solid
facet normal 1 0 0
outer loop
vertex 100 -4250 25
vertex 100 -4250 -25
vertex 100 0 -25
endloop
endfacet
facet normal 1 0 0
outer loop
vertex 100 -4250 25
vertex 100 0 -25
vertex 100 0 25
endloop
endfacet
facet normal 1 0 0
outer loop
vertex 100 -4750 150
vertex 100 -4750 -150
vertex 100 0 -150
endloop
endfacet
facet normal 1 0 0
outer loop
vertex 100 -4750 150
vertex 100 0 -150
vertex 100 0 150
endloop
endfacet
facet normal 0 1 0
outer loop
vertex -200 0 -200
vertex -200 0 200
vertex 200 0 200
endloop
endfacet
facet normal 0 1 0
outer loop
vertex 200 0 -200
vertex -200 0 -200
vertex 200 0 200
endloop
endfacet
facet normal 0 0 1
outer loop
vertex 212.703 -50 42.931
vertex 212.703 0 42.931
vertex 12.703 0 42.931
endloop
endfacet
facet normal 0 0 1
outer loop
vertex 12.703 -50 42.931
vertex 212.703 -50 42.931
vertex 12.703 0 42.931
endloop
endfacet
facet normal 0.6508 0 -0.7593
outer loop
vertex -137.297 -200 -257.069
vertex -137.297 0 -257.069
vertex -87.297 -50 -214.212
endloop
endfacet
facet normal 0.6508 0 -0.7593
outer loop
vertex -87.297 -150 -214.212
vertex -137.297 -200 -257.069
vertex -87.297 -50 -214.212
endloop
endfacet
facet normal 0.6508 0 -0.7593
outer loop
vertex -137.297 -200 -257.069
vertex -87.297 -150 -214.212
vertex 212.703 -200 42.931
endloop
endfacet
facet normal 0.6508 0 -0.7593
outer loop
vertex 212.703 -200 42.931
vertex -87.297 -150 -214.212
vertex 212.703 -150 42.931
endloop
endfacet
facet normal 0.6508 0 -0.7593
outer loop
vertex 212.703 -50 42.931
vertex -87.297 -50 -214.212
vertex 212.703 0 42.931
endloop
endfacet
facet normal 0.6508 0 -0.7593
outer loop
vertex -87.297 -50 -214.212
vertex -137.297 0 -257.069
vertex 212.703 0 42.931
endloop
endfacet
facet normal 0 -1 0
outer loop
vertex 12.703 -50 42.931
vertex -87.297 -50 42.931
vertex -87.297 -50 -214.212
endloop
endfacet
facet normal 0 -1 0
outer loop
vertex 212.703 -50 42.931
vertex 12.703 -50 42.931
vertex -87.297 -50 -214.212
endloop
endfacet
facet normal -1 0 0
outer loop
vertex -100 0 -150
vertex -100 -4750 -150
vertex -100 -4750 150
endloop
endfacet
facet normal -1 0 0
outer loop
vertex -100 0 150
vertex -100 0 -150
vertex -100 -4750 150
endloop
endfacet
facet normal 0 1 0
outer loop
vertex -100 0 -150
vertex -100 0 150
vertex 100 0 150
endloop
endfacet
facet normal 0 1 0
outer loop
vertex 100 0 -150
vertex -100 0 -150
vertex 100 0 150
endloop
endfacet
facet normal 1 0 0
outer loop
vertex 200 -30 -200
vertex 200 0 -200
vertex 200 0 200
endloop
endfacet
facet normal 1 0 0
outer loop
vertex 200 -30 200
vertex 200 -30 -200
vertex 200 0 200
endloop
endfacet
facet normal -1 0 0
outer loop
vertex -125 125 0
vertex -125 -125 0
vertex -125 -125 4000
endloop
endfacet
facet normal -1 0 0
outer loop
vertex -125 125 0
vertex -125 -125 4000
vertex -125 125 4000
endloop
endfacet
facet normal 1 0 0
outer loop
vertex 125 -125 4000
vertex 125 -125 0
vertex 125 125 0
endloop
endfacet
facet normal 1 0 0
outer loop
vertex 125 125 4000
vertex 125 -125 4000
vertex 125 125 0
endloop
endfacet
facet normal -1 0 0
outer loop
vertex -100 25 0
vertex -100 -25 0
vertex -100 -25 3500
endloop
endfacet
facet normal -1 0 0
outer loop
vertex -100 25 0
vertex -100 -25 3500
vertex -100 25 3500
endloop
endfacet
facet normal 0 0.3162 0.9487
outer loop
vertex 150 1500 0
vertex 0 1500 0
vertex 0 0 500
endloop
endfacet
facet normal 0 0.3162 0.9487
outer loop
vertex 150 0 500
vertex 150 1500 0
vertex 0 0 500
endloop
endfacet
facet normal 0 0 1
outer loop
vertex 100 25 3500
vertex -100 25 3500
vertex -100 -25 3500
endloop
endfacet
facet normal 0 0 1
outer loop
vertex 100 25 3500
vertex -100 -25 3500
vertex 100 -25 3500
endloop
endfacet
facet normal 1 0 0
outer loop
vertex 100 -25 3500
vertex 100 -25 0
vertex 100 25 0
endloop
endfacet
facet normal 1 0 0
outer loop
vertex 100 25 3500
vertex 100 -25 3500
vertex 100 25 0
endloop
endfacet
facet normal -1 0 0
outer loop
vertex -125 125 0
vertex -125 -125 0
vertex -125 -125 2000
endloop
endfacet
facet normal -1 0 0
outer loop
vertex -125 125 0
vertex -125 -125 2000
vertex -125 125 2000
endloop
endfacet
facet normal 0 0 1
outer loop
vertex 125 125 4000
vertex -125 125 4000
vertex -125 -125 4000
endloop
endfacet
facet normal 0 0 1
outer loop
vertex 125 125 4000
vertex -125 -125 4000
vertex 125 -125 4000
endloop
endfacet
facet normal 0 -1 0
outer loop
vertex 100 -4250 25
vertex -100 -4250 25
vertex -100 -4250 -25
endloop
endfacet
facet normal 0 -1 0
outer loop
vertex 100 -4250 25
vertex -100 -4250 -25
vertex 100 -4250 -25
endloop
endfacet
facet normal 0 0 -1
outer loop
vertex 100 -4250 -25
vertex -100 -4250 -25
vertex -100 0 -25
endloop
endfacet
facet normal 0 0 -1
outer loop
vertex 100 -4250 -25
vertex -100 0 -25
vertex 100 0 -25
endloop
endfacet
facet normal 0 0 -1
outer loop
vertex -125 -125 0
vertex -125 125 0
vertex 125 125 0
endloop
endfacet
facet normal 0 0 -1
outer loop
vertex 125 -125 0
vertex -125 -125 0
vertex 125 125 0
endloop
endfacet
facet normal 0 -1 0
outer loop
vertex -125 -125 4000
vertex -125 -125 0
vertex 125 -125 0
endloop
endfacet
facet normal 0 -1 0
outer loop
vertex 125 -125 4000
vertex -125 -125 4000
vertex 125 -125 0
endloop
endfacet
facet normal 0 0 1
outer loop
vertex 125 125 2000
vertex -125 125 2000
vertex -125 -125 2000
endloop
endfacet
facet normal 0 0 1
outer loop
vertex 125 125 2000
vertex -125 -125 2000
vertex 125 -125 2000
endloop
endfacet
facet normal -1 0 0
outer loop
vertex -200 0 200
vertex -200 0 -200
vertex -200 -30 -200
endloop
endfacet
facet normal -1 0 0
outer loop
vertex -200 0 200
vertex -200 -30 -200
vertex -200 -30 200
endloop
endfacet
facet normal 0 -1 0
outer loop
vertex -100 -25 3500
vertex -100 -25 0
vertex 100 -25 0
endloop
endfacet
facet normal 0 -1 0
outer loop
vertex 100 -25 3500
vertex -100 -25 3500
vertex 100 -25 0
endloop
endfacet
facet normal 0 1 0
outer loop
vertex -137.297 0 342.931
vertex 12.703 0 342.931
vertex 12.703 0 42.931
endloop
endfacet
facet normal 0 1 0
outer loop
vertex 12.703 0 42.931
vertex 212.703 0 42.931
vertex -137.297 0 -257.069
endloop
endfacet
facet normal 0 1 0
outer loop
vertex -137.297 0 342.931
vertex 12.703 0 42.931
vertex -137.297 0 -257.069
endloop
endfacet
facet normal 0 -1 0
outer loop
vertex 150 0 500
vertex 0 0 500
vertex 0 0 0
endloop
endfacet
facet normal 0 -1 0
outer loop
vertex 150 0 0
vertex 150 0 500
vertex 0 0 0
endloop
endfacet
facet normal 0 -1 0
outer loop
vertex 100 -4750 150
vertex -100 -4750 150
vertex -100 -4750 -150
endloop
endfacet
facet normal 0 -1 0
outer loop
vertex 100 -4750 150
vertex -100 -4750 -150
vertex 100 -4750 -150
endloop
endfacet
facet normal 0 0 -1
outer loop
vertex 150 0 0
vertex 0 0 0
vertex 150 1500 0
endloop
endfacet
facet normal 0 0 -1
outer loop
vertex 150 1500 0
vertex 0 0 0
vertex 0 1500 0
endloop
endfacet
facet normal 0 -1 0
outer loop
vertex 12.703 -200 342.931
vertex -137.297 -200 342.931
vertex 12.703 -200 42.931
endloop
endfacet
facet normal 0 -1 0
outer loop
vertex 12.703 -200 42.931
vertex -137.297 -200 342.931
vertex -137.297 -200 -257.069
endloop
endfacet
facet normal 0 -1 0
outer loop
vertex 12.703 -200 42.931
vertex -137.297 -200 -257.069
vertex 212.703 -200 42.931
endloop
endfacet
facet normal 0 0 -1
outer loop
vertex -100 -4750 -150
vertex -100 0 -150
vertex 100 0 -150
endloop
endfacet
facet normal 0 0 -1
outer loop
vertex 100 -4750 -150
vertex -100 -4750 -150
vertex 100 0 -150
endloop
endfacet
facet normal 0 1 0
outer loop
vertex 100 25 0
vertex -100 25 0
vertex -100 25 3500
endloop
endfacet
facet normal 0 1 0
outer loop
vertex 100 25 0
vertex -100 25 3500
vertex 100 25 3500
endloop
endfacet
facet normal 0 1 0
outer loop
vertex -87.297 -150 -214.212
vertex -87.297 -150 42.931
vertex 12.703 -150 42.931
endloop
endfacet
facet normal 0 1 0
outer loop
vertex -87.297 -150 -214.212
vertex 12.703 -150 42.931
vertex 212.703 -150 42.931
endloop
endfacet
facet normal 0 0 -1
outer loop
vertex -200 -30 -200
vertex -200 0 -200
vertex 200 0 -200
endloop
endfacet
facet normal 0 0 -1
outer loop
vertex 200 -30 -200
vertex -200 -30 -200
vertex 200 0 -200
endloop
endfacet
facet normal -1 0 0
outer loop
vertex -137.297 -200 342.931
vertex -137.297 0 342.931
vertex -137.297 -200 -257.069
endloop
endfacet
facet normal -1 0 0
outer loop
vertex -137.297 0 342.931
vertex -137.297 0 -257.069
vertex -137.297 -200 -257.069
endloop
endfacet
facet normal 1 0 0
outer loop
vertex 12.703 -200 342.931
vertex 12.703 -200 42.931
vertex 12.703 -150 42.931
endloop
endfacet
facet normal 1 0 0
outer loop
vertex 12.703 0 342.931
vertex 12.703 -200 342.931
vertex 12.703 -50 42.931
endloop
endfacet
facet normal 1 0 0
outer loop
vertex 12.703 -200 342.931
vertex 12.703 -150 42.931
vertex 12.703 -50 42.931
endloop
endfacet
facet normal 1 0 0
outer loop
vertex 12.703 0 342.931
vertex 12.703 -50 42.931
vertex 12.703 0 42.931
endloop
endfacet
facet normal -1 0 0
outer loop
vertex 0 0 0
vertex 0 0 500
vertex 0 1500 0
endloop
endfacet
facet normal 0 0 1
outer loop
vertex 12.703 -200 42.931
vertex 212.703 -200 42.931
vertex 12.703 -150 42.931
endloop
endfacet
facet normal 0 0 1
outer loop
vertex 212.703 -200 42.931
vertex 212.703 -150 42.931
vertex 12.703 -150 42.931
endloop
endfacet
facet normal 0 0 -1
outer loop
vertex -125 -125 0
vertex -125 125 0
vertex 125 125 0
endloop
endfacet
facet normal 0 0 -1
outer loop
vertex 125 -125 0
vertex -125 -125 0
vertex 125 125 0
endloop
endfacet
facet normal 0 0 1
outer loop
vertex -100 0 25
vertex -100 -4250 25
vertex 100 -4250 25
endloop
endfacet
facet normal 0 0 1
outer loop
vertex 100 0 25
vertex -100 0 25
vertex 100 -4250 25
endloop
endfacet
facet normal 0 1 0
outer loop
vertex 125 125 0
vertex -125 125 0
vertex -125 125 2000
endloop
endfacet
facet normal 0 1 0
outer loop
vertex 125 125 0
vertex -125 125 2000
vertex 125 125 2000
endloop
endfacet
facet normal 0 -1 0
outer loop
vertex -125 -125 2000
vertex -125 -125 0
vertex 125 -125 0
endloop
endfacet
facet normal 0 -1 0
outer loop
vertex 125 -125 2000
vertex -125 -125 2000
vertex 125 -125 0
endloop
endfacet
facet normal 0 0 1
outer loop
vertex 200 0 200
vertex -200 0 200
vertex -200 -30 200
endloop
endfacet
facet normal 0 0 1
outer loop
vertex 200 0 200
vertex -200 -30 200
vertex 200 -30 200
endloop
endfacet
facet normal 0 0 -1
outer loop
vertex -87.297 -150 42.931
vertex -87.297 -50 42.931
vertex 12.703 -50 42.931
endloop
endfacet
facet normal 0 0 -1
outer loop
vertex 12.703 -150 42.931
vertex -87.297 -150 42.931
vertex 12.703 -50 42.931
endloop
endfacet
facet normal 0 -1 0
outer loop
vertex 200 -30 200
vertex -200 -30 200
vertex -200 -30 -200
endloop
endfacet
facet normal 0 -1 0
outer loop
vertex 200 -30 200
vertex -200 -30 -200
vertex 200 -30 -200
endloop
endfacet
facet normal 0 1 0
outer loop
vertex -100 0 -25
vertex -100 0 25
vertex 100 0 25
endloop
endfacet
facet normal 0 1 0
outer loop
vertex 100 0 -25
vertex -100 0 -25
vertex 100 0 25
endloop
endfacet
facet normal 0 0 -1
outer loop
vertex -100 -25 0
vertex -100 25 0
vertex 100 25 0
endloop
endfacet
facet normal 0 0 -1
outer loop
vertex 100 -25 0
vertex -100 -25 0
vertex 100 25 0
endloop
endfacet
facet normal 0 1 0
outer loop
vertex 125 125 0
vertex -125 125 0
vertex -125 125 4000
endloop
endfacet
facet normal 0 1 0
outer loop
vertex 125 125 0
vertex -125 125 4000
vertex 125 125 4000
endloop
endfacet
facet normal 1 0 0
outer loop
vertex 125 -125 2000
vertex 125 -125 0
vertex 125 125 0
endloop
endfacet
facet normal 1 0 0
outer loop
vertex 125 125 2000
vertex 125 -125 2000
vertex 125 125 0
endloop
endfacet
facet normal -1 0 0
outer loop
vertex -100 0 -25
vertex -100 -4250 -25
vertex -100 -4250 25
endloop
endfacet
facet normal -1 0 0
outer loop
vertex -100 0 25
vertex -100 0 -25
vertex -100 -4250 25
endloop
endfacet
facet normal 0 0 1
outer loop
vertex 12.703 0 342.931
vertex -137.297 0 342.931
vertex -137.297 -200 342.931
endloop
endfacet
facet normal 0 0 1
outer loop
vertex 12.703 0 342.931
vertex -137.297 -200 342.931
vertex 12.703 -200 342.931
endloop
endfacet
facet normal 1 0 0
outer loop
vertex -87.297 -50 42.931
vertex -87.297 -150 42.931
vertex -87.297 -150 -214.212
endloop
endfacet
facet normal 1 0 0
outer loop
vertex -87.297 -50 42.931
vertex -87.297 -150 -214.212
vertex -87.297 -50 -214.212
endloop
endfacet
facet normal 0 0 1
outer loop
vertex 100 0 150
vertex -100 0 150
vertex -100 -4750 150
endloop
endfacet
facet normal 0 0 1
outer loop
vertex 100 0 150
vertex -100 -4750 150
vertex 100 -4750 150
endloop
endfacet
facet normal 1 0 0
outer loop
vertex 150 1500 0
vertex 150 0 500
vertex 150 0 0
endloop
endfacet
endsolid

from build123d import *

# Parameters (mm, degrees)
F0_W      = 250
F0_H      = 250
F1_DEPTH  = 4000
F2_W      = 200
F2_H      = 50
F3_DEPTH  = 3500
F4_W      = 200
F4_H      = 300
F5_DEPTH  = 4750
F7_DEPTH  = 200
F8_W      = 300
F8_H      = 100
F9_DEPTH  = 300.001
F10_W     = 200
F10_H     = 50
F11_DEPTH = 4250
F12_W     = 100
F12_H     = 100
F13_DEPTH = 300
F14_W     = 400
F14_H     = 400
F15_DEPTH = 30
F17_DEPTH = 150
F18_W     = 250
F18_H     = 250
F19_DEPTH = 2000


with BuildPart() as f1:
    # F0 (on Top) → F1 (new body)
    with BuildSketch(Plane.XY):
        Rectangle(F0_W, F0_H)
    extrude(amount=F1_DEPTH)


with BuildPart() as f3:
    # F2 (on Top) → F3 (new body)
    with BuildSketch(Plane.XY):
        Rectangle(F2_W, F2_H)
    extrude(amount=F3_DEPTH)


with BuildPart() as f5:
    # F4 (on Front) → F5 (new body)
    with BuildSketch(Plane.XZ):
        Rectangle(F4_W, F4_H)
    extrude(amount=F5_DEPTH)


with BuildPart() as f7:
    # F6 (on Front) → F7 (new body)
    with BuildSketch(Plane.XZ):
        Polygon((212.7028834443, 42.9310392426), (-137.2971165557, 42.9310392426), (-137.2971165557, -257.0689607574), align=None)
    extrude(amount=F7_DEPTH)

    # F8 (on face) → F9 (cut, through all)
    with BuildSketch(Plane.XY.offset(42.9310392426)):
        with Locations((62.7028834443, -100)):
            Rectangle(F8_W, F8_H)
    extrude(amount=-F9_DEPTH, mode=Mode.SUBTRACT)

    # F12 (on face) → F13 (join)
    with BuildSketch(Plane.XY.offset(42.9310392426)):
        Polygon((12.7028834443, 0), (-137.2971165557, 0), (-137.2971165557, -200), (12.7028834443, -200), (12.7028834443, -150), (-87.2971165557, -150), (-87.2971165557, -50), (12.7028834443, -50), align=None)
        with Locations((-37.2971165557, -100)):
            Rectangle(F12_W, F12_H)
    extrude(amount=F13_DEPTH)


with BuildPart() as f11:
    # F10 (on Front) → F11 (new body)
    with BuildSketch(Plane.XZ):
        Rectangle(F10_W, F10_H)
    extrude(amount=F11_DEPTH)


with BuildPart() as f15:
    # F14 (on Front) → F15 (new body)
    with BuildSketch(Plane.XZ):
        Rectangle(F14_W, F14_H)
    extrude(amount=F15_DEPTH)


with BuildPart() as f17:
    # F16 (on Right) → F17 (new body)
    with BuildSketch(Plane.YZ):
        Polygon((0, 500), (0, 0), (1500, 0), align=None)
    extrude(amount=F17_DEPTH)


with BuildPart() as f19:
    # F18 (on Top) → F19 (new body)
    with BuildSketch(Plane.XY):
        Rectangle(F18_W, F18_H)
    extrude(amount=F19_DEPTH)


solid = Compound([f1.part, f3.part, f5.part, f7.part, f11.part, f15.part, f17.part, f19.part])
